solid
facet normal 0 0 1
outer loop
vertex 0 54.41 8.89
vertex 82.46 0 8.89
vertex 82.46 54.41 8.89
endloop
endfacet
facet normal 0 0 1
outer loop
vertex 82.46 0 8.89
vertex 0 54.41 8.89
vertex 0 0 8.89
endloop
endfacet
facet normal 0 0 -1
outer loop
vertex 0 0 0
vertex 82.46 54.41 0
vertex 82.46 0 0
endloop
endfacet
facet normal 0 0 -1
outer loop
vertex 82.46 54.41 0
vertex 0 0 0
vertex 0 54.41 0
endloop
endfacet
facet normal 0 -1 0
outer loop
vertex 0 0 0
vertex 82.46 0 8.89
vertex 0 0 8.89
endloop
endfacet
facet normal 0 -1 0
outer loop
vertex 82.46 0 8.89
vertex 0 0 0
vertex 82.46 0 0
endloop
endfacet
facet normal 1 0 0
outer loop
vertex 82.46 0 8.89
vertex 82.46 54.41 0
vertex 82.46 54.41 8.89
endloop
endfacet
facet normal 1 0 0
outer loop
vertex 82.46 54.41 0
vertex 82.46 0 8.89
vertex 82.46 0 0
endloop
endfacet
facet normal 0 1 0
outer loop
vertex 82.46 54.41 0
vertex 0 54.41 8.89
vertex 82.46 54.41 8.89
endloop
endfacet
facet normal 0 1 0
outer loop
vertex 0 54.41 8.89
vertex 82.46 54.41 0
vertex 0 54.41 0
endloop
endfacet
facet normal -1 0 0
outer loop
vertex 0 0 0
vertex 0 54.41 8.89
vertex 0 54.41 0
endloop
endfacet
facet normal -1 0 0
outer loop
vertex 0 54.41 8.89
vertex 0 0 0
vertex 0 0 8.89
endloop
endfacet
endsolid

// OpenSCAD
//
// Half size breadboard
//
module bbs_half_breadboard()
{
    cube([82.46, 54.41, 8.89], center=false);
}

bbs_half_breadboard();
